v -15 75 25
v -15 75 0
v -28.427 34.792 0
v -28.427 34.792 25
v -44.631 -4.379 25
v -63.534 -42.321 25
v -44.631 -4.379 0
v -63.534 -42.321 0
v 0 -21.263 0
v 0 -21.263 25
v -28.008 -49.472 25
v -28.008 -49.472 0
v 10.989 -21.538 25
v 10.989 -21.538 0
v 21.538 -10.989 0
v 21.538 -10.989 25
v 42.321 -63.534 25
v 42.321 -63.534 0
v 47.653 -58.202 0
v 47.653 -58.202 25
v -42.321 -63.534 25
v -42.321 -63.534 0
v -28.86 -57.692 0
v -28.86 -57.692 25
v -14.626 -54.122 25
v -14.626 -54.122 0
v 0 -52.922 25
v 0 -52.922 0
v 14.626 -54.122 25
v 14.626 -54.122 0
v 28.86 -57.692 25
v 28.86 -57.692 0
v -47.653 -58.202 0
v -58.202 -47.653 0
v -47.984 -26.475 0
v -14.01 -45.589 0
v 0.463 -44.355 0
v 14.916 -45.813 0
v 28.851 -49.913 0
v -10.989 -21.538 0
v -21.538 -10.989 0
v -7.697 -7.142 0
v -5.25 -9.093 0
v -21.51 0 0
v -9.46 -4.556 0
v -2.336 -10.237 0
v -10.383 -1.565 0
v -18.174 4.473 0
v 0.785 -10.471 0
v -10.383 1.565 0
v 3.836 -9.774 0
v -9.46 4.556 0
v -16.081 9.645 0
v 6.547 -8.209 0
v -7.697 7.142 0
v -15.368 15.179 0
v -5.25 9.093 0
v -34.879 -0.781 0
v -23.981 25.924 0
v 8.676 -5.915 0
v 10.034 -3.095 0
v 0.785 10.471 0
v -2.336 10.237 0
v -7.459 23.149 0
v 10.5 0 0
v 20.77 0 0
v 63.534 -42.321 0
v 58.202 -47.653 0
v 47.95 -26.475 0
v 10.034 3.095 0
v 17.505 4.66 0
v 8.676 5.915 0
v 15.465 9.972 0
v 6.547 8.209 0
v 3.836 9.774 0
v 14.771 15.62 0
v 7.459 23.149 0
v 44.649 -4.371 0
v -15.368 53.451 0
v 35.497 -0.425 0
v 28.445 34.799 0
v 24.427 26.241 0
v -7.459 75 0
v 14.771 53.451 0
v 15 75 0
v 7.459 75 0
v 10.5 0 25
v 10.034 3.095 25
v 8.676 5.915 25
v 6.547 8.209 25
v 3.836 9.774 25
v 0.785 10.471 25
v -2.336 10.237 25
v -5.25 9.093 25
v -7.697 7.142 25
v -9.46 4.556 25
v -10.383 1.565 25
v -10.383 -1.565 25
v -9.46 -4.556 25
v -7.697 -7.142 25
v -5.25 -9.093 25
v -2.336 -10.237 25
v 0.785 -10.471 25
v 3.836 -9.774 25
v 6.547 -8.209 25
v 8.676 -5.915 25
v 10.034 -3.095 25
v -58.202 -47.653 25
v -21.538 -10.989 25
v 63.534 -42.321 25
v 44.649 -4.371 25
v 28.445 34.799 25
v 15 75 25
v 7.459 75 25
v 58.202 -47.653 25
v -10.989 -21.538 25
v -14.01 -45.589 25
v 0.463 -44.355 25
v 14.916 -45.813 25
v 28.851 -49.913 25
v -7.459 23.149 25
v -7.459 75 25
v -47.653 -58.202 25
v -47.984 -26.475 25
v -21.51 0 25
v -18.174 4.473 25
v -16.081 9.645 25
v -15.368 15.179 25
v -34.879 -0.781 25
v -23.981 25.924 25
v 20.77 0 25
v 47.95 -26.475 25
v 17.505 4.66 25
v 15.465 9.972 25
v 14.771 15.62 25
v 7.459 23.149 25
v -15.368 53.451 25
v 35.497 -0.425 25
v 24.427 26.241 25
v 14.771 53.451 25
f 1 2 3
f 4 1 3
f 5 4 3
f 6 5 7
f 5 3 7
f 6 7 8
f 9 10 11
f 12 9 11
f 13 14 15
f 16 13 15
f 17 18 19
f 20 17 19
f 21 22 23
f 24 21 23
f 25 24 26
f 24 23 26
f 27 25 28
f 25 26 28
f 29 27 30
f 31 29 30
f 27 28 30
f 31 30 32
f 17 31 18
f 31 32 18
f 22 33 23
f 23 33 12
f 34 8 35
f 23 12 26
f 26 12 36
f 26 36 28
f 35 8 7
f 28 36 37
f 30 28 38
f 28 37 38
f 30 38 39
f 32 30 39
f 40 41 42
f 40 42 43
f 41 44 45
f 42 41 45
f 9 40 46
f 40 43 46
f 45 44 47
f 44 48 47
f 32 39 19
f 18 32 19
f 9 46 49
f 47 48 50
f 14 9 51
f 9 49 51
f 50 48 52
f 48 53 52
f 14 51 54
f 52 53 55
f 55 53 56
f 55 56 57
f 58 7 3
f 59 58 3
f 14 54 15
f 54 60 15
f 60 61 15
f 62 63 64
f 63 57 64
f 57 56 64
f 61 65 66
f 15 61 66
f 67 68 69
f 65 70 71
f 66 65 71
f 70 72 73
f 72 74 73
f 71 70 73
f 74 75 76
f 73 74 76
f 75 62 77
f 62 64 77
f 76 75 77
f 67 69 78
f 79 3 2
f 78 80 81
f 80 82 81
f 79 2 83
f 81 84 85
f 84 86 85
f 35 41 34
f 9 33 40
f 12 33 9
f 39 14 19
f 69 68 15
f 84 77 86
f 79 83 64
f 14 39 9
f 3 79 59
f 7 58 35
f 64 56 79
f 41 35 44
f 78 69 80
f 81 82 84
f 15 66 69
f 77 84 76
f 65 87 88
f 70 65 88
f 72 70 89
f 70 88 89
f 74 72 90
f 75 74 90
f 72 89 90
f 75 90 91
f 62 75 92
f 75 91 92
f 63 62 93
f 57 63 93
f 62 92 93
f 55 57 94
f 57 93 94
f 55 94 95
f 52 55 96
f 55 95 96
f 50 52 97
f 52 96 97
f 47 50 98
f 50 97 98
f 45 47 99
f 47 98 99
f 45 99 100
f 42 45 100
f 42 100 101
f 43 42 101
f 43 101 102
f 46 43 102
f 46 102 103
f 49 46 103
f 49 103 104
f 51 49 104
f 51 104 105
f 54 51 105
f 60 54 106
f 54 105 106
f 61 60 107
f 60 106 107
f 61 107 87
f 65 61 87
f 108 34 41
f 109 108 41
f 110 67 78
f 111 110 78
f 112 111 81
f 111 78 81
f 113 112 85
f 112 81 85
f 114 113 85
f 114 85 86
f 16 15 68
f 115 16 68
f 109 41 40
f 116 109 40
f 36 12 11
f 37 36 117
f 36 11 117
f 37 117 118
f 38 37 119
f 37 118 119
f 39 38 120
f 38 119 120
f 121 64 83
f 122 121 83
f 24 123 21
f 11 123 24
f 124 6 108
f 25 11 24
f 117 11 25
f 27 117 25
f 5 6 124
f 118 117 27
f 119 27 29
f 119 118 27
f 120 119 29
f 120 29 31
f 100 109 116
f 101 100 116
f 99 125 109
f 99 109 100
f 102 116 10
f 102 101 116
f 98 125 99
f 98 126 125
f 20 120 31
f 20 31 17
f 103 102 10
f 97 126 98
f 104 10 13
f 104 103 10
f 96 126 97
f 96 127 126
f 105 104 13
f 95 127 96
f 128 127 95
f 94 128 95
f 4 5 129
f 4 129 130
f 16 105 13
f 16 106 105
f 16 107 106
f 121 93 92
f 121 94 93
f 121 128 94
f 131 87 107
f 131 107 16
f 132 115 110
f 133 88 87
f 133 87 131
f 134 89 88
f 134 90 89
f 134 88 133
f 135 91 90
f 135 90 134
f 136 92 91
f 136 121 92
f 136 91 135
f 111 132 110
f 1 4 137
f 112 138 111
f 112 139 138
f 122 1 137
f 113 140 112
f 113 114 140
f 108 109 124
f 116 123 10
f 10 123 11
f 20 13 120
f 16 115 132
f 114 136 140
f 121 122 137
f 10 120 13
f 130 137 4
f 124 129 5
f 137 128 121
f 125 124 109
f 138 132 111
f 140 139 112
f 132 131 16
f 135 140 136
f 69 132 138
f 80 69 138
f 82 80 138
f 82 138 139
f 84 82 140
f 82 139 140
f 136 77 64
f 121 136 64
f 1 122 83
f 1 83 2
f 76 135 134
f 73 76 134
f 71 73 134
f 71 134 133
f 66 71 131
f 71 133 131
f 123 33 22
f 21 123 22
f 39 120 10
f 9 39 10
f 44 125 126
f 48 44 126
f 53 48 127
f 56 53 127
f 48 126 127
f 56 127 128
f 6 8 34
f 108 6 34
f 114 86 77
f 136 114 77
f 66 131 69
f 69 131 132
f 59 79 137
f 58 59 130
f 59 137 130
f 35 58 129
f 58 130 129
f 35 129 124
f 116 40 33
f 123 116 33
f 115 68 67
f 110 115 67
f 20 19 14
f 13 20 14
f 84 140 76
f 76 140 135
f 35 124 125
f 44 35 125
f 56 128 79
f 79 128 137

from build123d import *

# Parameters (mm, degrees)
F1_DEPTH = 25
F2_DEPTH = 25
F3_R     = 10.5
F4_DEPTH = 25
F6_DEPTH = 25


with BuildPart() as f1:
    # F0 (on Top) → F1 (new body)
    with BuildSketch(Plane.XY):
        with BuildLine():
            Line((-7.459, 75), (-15, 75))
            Line((-15, 75), (-15, 15))
            ThreePointArc((-15, 15), (-16.614759, 6.882058), (-21.213203, 0))
            Line((-21.213203, 0), (-63.534251, -42.321048))
            Line((-63.534251, -42.321048), (-58.201959, -47.65334))
            Line((-58.201959, -47.65334), (-21.537765, -10.989146))
            Line((-21.537765, -10.989146), (-10.989146, -21.537765))
            Line((-10.989146, -21.537765), (-47.65334, -58.201959))
            Line((-47.65334, -58.201959), (-42.321048, -63.534251))
            Line((-42.321048, -63.534251), (0, -21.213203))
            Line((0, -21.213203), (42.321048, -63.534251))
            Line((42.321048, -63.534251), (47.65334, -58.201959))
            Line((47.65334, -58.201959), (10.989146, -21.537765))
            Line((10.989146, -21.537765), (21.537765, -10.989146))
            Line((21.537765, -10.989146), (58.201959, -47.65334))
            Line((58.201959, -47.65334), (63.534251, -42.321048))
            Line((63.534251, -42.321048), (21.213203, 0))
            ThreePointArc((21.213203, 0), (16.614759, 6.882058), (15, 15))
            Line((15, 15), (15, 75))
            Line((15, 75), (7.459, 75))
            Line((7.459, 75), (7.459, 23.149))
            Line((7.459, 23.149), (-7.459, 23.149))
            Line((-7.459, 23.149), (-7.459, 75))
        make_face()
    extrude(amount=F1_DEPTH)

    # F0 (on Top) → F2 (join)
    with BuildSketch(Plane.XY):
        with BuildLine():
            Line((-15, 15), (-15, 75))
            ThreePointArc((-15, 75), (-36.186316, 15.064984), (-63.534251, -42.321048))
            Line((-63.534251, -42.321048), (-21.213203, 0))
            ThreePointArc((-21.213203, 0), (-16.614759, 6.882058), (-15, 15))
        make_face()
        with BuildLine():
            ThreePointArc((63.534251, -42.321048), (36.207052, 15.073562), (15, 75))
            Line((15, 75), (15, 15))
            ThreePointArc((15, 15), (16.614759, 6.882058), (21.213203, 0))
            Line((21.213203, 0), (63.534251, -42.321048))
        make_face()
        with BuildLine():
            Line((0, -21.213203), (-42.321048, -63.534251))
            ThreePointArc((-42.321048, -63.534251), (0, -52.921768), (42.321048, -63.534251))
            Line((42.321048, -63.534251), (0, -21.213203))
        make_face()
    extrude(amount=F2_DEPTH)

    # F3 (on face) → F4 (cut)
    with BuildSketch(Plane.XY.offset(25)):
        Circle(F3_R)
    extrude(amount=-F4_DEPTH, mode=Mode.SUBTRACT)

    # F5 (on face) → F6 (cut)
    with BuildSketch(Plane.XY.offset(25)):
        with BuildLine():
            ThreePointArc((-15.367649, 53.450763), (-29.148649, 12.456713), (-47.984254, -26.474612))
            Line((-47.984254, -26.474612), (-21.509642, 0))
            ThreePointArc((-21.509642, 0), (-16.96133, 6.99149), (-15.367649, 15.178569))
            Line((-15.367649, 15.178569), (-15.367649, 53.450763))
        make_face()
        with BuildLine():
            ThreePointArc((-28.007545, -49.472019), (0.463168, -44.355391), (28.851137, -49.912784))
            Line((28.851137, -49.912784), (0, -21.263063))
            Line((0, -21.263063), (-28.007545, -49.472019))
        make_face()
        with BuildLine():
            ThreePointArc((47.949795, -26.474612), (29.787416, 12.835137), (14.770781, 53.450763))
            Line((14.770781, 53.450763), (14.770781, 15.619874))
            ThreePointArc((14.770781, 15.619874), (16.322077, 7.253759), (20.769704, 0))
            Line((20.769704, 0), (47.949795, -26.474612))
        make_face()
    extrude(amount=-F6_DEPTH, mode=Mode.SUBTRACT)


solid = f1.part
